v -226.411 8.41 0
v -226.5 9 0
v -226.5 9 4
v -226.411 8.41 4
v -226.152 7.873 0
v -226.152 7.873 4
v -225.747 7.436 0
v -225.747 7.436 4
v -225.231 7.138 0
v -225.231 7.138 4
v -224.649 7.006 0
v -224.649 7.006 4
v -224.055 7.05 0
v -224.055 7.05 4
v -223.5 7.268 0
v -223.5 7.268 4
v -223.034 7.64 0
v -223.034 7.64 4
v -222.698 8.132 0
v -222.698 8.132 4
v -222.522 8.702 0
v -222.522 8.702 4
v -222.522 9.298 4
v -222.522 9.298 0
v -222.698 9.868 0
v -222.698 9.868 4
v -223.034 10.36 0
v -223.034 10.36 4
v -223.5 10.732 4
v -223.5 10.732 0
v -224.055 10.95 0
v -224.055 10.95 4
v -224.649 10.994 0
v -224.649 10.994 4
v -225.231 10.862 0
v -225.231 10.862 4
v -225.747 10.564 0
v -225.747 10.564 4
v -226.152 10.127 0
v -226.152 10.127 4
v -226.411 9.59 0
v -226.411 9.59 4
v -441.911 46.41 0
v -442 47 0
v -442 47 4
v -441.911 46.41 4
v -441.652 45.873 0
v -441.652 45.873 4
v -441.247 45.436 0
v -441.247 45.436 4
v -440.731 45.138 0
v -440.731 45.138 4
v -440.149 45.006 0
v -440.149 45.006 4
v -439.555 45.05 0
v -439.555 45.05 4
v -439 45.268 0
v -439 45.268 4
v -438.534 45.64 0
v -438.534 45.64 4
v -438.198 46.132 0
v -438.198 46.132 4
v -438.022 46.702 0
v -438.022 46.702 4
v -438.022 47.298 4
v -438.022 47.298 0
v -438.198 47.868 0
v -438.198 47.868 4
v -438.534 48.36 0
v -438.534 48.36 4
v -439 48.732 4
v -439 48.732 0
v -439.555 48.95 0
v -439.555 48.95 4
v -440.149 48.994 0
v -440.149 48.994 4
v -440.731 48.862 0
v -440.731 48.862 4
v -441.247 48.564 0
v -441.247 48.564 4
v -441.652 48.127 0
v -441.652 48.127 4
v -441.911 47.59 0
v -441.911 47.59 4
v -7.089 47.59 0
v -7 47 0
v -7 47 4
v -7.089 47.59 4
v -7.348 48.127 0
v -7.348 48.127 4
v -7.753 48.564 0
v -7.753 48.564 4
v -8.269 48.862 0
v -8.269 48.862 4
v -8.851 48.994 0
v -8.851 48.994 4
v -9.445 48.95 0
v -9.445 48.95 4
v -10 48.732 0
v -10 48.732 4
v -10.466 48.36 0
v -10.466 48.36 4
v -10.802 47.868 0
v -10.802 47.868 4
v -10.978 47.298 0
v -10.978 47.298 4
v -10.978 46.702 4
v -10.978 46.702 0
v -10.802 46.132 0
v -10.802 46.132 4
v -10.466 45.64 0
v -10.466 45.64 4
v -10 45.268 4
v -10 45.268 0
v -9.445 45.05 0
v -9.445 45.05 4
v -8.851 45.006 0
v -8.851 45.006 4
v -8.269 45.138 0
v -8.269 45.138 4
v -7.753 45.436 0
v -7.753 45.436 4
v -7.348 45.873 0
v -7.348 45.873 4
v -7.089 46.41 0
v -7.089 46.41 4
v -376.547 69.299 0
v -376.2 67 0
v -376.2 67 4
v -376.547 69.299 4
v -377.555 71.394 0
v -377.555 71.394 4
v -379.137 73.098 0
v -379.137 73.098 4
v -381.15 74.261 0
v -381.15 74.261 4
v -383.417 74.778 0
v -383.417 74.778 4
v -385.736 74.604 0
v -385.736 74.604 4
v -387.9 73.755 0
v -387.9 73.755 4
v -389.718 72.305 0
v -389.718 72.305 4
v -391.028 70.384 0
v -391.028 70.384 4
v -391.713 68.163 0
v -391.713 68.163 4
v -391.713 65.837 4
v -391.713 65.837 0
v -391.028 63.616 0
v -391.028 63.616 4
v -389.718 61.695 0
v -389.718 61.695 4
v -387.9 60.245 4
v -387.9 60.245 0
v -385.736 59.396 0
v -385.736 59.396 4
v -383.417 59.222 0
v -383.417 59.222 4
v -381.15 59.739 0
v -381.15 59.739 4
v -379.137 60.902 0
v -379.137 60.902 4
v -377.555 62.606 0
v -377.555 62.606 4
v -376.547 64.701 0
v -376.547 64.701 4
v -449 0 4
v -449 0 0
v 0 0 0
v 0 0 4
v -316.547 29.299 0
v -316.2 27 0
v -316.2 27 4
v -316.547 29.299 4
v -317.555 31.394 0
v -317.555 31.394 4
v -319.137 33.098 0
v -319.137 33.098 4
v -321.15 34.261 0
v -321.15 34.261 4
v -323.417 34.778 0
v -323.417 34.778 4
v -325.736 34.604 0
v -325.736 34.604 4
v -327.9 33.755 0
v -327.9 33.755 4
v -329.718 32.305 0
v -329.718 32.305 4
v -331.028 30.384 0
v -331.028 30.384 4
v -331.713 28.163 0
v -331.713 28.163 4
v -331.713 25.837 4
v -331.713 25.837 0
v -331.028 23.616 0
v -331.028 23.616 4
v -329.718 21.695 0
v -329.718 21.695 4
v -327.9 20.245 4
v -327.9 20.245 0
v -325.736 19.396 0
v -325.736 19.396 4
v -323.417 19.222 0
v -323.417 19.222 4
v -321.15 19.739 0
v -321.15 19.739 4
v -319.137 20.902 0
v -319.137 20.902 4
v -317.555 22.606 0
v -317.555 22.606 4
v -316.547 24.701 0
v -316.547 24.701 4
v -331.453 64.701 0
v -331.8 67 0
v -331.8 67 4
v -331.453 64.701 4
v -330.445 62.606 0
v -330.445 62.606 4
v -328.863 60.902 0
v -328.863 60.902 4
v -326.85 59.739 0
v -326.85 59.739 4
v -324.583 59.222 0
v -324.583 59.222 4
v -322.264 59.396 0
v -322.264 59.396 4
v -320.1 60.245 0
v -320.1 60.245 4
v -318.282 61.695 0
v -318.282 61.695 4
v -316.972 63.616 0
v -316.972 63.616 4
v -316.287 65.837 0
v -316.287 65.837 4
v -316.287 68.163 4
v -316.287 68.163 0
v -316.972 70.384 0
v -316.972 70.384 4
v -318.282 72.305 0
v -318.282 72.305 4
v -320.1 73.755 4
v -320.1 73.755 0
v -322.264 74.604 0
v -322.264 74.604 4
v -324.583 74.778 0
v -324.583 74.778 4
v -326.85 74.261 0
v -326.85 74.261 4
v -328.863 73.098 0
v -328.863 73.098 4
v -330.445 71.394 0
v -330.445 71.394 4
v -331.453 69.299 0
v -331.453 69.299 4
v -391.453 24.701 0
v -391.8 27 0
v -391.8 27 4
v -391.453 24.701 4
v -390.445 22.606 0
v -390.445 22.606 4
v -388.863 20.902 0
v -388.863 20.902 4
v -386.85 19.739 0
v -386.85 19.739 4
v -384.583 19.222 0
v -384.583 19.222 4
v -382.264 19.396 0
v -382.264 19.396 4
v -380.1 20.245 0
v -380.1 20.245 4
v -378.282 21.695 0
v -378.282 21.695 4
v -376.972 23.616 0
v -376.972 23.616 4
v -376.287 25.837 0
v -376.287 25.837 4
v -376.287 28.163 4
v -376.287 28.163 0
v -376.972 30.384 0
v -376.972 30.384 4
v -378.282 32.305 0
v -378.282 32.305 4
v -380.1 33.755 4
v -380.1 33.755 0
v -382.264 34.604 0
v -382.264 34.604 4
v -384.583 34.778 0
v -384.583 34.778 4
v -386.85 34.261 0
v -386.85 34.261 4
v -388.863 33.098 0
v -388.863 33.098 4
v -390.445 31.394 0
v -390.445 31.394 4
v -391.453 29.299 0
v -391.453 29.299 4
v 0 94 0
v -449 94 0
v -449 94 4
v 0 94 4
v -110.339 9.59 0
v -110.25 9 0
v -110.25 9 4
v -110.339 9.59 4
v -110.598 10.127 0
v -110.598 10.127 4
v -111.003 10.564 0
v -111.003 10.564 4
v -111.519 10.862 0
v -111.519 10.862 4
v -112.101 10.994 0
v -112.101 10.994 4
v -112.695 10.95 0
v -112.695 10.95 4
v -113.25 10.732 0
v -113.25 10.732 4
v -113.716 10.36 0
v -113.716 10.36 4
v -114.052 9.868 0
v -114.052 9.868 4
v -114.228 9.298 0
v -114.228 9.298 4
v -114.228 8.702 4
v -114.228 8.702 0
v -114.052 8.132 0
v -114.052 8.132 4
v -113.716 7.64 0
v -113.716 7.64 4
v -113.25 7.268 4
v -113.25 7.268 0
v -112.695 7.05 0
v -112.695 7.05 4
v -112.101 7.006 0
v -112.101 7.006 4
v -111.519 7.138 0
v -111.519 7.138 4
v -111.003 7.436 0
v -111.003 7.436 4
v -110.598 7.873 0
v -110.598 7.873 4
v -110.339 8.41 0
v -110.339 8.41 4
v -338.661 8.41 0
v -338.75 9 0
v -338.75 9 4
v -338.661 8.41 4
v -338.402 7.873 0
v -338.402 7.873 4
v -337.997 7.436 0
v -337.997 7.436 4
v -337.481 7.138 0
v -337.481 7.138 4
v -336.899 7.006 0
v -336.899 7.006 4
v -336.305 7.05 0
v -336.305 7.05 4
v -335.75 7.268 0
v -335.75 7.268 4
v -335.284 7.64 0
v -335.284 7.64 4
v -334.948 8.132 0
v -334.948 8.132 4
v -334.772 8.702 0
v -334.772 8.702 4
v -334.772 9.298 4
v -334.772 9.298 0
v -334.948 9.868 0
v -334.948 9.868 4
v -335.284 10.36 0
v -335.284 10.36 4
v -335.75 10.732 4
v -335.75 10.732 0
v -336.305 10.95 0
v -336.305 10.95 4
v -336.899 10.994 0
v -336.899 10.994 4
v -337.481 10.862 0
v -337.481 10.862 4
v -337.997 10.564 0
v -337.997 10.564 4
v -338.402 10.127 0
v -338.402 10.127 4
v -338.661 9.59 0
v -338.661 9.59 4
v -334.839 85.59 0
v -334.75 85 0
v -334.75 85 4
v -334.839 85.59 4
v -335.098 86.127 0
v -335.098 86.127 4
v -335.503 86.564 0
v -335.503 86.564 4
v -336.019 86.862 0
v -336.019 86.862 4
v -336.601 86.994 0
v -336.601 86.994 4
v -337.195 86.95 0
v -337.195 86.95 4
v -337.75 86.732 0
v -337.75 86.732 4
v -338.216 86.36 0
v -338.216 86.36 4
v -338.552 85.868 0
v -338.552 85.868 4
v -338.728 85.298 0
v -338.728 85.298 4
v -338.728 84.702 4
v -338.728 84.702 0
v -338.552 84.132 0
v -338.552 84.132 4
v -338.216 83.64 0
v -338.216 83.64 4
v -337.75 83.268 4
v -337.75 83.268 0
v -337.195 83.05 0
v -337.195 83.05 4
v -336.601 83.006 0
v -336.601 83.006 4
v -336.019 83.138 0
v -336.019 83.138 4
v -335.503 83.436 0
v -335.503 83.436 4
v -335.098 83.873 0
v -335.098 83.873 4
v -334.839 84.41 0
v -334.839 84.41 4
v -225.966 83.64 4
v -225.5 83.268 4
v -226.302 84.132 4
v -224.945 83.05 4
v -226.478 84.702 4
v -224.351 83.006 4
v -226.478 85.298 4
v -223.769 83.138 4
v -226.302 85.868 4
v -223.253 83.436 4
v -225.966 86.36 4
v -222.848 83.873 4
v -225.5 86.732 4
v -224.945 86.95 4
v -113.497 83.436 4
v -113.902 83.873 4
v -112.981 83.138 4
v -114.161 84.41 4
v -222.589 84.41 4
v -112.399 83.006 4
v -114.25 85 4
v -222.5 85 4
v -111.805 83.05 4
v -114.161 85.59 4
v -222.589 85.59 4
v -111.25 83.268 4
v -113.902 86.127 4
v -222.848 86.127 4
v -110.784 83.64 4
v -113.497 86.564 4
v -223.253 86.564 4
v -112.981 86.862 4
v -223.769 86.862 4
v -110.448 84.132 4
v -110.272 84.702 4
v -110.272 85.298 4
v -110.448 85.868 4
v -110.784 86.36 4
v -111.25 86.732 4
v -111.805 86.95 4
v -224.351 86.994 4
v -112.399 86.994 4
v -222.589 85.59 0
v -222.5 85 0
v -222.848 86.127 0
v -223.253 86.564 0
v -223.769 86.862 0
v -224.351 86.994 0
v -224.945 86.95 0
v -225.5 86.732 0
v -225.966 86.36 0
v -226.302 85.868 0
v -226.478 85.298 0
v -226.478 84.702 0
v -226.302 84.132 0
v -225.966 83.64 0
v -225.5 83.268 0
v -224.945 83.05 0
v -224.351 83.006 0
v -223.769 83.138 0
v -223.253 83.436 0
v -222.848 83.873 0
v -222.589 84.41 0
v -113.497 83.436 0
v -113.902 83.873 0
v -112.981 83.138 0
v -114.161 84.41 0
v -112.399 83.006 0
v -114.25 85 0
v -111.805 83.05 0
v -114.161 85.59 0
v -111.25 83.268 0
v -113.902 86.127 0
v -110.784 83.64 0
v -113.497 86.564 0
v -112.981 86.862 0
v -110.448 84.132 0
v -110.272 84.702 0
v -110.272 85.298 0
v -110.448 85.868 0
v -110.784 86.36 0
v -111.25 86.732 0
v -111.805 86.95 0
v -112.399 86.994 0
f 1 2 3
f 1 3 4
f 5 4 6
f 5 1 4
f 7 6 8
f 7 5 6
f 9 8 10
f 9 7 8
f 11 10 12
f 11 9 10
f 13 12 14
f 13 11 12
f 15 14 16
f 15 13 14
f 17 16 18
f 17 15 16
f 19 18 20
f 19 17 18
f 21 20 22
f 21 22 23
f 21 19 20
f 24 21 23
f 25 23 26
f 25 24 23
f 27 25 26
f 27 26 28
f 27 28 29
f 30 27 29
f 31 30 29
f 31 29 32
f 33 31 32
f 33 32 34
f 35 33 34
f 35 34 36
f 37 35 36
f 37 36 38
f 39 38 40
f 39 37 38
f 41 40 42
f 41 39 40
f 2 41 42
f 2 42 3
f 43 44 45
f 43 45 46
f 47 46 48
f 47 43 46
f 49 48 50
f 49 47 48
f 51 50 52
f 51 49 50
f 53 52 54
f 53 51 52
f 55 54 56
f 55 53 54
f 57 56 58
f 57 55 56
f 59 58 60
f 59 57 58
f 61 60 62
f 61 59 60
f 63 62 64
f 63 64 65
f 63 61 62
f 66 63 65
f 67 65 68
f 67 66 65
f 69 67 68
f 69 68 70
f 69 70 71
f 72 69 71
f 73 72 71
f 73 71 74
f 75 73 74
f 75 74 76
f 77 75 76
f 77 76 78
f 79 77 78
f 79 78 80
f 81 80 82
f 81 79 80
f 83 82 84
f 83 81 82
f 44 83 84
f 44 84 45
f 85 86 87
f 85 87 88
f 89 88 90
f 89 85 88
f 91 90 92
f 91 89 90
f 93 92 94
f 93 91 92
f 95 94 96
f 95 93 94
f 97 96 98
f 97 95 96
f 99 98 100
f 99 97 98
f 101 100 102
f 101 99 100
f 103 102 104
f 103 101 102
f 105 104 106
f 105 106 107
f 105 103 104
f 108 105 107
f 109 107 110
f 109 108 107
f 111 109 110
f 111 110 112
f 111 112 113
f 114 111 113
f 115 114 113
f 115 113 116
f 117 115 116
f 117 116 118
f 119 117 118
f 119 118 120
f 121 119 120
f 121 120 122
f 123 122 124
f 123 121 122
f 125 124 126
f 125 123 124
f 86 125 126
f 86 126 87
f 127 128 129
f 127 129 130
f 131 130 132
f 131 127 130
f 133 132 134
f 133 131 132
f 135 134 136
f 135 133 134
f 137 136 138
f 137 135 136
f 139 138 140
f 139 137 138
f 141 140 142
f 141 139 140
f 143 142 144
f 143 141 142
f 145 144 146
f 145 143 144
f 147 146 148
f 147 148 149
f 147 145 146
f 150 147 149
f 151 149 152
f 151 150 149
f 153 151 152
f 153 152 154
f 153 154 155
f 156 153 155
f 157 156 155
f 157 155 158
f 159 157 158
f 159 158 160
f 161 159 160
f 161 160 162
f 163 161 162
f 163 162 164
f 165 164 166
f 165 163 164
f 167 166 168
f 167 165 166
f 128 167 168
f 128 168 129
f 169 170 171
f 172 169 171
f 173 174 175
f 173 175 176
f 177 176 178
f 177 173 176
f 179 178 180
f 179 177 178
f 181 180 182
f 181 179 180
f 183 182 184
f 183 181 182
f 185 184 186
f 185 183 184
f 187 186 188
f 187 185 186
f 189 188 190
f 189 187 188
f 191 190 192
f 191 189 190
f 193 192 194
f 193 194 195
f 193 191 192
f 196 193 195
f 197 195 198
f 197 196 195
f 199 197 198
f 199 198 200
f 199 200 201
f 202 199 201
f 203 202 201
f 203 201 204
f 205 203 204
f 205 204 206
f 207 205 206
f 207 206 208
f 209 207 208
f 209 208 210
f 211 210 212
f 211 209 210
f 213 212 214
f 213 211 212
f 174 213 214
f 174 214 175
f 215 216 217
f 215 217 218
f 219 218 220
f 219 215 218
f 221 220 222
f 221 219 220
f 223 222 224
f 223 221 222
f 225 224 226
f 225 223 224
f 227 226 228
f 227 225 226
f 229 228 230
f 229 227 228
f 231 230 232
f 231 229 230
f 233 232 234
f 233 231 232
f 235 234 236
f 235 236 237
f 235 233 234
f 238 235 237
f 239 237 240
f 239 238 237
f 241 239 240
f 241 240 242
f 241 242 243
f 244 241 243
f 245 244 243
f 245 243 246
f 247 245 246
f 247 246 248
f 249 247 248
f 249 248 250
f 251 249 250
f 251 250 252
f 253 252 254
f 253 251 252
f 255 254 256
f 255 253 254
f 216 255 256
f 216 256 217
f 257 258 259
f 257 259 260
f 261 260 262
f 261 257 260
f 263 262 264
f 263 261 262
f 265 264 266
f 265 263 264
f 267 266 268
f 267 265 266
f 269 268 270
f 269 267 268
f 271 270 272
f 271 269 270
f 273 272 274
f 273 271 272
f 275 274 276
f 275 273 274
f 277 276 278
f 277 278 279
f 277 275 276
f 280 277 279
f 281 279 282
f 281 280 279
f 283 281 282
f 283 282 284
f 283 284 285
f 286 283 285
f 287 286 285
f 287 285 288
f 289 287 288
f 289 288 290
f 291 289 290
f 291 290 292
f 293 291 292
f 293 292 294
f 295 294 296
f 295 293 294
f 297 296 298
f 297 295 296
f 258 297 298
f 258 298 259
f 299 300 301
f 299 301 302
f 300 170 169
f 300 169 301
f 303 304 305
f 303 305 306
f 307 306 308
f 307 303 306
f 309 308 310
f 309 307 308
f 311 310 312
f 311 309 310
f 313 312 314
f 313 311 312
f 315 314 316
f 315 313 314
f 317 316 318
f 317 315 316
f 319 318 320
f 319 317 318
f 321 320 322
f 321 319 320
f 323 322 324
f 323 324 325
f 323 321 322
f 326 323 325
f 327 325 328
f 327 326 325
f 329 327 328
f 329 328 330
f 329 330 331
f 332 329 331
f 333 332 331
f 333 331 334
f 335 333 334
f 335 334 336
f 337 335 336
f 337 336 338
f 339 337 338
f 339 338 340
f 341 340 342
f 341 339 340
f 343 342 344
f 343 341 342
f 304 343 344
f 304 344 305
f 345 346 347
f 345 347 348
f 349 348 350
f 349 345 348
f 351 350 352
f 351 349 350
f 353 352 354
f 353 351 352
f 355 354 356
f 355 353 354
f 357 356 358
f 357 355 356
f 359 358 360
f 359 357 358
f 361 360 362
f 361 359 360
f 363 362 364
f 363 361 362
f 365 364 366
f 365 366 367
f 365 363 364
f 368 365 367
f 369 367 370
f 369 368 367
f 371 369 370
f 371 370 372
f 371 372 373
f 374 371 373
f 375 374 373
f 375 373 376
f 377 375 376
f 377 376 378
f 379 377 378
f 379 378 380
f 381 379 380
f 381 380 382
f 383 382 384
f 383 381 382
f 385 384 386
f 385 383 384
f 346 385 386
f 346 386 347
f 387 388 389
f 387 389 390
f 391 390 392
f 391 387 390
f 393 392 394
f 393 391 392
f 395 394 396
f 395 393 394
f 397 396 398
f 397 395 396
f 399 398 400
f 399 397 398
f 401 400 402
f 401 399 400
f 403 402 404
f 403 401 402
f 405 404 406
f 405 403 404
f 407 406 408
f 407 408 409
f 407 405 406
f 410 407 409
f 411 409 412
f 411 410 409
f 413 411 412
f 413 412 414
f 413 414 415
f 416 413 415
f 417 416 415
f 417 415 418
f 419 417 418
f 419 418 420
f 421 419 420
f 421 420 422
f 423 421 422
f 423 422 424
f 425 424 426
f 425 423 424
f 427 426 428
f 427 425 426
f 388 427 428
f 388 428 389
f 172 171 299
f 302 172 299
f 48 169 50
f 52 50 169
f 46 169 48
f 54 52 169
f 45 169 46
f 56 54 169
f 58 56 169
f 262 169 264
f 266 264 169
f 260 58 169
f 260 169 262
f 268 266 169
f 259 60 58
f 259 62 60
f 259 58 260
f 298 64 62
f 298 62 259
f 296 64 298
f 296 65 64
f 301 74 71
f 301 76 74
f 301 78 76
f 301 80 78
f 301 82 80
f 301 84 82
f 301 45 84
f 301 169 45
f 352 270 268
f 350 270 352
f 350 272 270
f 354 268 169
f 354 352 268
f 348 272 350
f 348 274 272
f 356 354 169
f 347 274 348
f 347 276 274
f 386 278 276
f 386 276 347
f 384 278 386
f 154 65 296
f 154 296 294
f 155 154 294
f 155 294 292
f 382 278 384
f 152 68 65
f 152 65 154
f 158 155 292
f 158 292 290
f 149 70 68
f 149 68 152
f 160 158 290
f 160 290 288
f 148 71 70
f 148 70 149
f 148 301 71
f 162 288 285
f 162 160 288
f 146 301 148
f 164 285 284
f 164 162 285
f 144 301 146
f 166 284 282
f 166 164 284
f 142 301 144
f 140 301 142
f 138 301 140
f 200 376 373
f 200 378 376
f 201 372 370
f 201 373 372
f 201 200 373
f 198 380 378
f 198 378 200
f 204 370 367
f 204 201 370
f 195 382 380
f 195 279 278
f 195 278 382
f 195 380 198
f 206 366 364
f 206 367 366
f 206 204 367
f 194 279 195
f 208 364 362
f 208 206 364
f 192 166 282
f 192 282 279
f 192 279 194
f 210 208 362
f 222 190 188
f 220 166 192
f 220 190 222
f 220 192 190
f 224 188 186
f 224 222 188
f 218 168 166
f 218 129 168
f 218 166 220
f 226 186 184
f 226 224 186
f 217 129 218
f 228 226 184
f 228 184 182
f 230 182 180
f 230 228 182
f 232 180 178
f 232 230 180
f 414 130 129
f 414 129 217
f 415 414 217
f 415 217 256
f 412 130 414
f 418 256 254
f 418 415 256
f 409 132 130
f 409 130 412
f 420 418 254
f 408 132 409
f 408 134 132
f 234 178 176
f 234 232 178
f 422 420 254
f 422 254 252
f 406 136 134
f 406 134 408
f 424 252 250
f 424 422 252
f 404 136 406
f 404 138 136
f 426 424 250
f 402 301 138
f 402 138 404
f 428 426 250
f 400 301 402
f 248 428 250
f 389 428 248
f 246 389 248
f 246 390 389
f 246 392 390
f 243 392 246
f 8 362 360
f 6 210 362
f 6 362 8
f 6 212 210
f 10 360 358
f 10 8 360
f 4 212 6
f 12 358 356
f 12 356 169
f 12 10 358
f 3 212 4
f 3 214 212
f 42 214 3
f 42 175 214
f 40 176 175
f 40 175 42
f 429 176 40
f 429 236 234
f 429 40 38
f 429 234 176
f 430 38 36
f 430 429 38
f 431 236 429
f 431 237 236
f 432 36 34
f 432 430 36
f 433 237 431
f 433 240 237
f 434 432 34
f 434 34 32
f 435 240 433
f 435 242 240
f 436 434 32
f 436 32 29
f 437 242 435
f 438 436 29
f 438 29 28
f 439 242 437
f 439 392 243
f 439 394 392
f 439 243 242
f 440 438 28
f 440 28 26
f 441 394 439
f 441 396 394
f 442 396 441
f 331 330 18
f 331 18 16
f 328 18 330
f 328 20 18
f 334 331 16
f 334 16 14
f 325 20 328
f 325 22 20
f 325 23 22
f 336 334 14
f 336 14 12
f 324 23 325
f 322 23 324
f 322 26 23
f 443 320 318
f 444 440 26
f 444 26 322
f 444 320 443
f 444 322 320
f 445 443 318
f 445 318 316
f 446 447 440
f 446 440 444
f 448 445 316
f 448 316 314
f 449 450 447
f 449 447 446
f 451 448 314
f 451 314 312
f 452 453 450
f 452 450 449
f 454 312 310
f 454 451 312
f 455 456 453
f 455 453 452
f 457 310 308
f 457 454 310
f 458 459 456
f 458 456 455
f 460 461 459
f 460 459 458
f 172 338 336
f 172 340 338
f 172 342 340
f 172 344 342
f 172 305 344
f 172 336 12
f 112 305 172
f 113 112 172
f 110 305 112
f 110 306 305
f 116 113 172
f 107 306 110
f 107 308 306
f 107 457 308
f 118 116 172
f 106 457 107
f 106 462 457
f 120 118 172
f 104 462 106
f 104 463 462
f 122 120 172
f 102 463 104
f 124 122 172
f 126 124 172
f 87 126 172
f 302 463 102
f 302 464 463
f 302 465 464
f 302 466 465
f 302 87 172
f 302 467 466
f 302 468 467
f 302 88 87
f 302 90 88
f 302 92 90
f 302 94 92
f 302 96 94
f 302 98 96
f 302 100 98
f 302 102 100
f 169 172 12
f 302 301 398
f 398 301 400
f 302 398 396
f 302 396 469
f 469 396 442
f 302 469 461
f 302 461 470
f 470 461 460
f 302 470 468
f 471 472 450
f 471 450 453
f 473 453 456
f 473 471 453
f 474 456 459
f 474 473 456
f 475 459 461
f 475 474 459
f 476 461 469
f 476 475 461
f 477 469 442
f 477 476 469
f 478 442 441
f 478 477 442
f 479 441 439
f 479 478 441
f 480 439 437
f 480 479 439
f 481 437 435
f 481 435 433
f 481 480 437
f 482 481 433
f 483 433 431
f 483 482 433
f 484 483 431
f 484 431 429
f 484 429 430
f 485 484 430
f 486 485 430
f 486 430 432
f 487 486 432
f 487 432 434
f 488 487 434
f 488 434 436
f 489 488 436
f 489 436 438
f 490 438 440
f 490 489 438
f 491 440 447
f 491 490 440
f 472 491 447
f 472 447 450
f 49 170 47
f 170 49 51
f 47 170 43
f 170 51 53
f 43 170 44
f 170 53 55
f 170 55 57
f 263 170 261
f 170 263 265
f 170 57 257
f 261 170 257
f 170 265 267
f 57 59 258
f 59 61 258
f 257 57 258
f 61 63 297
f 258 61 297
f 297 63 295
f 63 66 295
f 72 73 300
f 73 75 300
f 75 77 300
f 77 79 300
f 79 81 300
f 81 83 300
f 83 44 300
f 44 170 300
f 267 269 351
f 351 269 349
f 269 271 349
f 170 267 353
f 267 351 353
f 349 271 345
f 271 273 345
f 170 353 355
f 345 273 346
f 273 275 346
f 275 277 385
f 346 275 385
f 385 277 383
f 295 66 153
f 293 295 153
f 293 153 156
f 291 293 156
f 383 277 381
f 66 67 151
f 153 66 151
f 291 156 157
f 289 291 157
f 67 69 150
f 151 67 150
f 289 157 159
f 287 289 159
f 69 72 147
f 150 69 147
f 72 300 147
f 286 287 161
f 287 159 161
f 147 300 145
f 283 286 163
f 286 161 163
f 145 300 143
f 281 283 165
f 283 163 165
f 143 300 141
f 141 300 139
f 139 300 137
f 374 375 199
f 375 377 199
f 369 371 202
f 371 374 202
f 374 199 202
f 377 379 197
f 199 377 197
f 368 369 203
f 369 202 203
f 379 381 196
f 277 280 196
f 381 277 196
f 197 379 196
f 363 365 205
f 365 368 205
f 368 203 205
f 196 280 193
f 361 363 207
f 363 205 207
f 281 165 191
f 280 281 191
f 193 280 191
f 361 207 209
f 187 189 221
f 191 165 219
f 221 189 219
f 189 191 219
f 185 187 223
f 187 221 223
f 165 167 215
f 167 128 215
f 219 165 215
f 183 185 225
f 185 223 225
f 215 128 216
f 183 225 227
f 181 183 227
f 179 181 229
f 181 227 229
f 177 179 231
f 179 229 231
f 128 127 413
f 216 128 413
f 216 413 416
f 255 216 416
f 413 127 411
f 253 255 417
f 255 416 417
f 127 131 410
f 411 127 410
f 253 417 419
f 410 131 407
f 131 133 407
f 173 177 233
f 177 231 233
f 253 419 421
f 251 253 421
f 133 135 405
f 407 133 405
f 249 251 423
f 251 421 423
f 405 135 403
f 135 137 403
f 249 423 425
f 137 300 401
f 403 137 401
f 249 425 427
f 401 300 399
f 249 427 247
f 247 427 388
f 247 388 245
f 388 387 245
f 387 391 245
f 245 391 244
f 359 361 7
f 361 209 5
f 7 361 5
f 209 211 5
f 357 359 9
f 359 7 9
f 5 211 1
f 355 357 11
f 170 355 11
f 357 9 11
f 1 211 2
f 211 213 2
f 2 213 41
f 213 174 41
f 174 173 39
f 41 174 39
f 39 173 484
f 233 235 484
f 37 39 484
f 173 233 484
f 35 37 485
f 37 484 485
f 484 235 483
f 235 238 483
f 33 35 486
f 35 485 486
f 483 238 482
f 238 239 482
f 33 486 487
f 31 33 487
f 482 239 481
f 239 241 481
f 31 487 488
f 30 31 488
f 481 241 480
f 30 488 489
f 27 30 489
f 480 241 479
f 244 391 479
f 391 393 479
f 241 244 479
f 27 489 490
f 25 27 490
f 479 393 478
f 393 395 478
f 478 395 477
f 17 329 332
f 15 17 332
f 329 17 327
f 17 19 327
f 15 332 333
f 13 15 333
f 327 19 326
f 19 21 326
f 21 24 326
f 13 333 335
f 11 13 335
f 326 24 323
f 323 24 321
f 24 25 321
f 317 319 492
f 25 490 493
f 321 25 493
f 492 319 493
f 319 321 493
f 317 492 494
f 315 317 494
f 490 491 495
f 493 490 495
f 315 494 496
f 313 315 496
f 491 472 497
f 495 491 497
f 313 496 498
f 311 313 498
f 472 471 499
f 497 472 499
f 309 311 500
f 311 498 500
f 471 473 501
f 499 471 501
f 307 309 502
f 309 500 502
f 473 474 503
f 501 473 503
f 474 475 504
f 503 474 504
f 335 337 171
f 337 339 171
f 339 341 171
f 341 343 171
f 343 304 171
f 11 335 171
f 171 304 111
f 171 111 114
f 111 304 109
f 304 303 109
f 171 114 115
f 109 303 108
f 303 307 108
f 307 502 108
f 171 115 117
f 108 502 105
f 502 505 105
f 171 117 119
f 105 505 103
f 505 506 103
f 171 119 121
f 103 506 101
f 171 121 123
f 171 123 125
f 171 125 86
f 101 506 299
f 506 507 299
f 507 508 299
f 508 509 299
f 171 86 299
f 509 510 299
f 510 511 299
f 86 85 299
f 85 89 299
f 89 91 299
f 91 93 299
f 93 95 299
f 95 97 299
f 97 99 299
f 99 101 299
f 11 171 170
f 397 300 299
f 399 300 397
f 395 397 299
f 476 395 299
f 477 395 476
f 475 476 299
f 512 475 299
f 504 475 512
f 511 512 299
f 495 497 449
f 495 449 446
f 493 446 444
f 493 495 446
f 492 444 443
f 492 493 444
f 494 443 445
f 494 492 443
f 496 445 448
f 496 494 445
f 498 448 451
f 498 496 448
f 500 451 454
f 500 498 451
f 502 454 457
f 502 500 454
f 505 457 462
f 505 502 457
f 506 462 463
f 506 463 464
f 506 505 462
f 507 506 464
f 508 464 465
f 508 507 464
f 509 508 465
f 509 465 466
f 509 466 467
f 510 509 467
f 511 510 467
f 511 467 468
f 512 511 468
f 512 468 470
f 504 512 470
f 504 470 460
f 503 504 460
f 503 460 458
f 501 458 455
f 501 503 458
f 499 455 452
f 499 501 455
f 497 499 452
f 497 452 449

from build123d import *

# Parameters (mm, degrees)
SCHIZZO1_W                   = 449
SCHIZZO1_H                   = 94
SCHIZZO1_R                   = 7.8
SCHIZZO1_R_2                 = 2
ESTRUSIONE_ESTRUSIONE1_DEPTH = 4


with BuildPart() as part:
    # Schizzo1 → Estrusione-Estrusione1 (new body)
    with BuildSketch(Plane.XY):
        with Locations((-224.5, 47)):
            Rectangle(SCHIZZO1_W, SCHIZZO1_H)
        with Locations(Location((-384, 27, 0), (0, 0, 180))):
            Circle(SCHIZZO1_R, mode=Mode.SUBTRACT)
        with Locations((-9, 47)):
            Circle(SCHIZZO1_R_2, mode=Mode.SUBTRACT)
        with Locations((-224.5, 85)):
            Circle(SCHIZZO1_R_2, mode=Mode.SUBTRACT)
        with Locations(Location((-440, 47, 0), (0, 0, 180))):
            Circle(SCHIZZO1_R_2, mode=Mode.SUBTRACT)
        with Locations(Location((-224.5, 9, 0), (0, 0, 180))):
            Circle(SCHIZZO1_R_2, mode=Mode.SUBTRACT)
        with Locations((-324, 27)):
            Circle(SCHIZZO1_R, mode=Mode.SUBTRACT)
        with Locations(Location((-324, 67, 0), (0, 0, 180))):
            Circle(SCHIZZO1_R, mode=Mode.SUBTRACT)
        with Locations((-336.75, 85)):
            Circle(SCHIZZO1_R_2, mode=Mode.SUBTRACT)
        with Locations((-384, 67)):
            Circle(SCHIZZO1_R, mode=Mode.SUBTRACT)
        with Locations(Location((-336.75, 9, 0), (0, 0, 180))):
            Circle(SCHIZZO1_R_2, mode=Mode.SUBTRACT)
        with Locations((-112.25, 9)):
            Circle(SCHIZZO1_R_2, mode=Mode.SUBTRACT)
        with Locations(Location((-112.25, 85, 0), (0, 0, 180))):
            Circle(SCHIZZO1_R_2, mode=Mode.SUBTRACT)
    extrude(amount=ESTRUSIONE_ESTRUSIONE1_DEPTH)


solid = part.part
